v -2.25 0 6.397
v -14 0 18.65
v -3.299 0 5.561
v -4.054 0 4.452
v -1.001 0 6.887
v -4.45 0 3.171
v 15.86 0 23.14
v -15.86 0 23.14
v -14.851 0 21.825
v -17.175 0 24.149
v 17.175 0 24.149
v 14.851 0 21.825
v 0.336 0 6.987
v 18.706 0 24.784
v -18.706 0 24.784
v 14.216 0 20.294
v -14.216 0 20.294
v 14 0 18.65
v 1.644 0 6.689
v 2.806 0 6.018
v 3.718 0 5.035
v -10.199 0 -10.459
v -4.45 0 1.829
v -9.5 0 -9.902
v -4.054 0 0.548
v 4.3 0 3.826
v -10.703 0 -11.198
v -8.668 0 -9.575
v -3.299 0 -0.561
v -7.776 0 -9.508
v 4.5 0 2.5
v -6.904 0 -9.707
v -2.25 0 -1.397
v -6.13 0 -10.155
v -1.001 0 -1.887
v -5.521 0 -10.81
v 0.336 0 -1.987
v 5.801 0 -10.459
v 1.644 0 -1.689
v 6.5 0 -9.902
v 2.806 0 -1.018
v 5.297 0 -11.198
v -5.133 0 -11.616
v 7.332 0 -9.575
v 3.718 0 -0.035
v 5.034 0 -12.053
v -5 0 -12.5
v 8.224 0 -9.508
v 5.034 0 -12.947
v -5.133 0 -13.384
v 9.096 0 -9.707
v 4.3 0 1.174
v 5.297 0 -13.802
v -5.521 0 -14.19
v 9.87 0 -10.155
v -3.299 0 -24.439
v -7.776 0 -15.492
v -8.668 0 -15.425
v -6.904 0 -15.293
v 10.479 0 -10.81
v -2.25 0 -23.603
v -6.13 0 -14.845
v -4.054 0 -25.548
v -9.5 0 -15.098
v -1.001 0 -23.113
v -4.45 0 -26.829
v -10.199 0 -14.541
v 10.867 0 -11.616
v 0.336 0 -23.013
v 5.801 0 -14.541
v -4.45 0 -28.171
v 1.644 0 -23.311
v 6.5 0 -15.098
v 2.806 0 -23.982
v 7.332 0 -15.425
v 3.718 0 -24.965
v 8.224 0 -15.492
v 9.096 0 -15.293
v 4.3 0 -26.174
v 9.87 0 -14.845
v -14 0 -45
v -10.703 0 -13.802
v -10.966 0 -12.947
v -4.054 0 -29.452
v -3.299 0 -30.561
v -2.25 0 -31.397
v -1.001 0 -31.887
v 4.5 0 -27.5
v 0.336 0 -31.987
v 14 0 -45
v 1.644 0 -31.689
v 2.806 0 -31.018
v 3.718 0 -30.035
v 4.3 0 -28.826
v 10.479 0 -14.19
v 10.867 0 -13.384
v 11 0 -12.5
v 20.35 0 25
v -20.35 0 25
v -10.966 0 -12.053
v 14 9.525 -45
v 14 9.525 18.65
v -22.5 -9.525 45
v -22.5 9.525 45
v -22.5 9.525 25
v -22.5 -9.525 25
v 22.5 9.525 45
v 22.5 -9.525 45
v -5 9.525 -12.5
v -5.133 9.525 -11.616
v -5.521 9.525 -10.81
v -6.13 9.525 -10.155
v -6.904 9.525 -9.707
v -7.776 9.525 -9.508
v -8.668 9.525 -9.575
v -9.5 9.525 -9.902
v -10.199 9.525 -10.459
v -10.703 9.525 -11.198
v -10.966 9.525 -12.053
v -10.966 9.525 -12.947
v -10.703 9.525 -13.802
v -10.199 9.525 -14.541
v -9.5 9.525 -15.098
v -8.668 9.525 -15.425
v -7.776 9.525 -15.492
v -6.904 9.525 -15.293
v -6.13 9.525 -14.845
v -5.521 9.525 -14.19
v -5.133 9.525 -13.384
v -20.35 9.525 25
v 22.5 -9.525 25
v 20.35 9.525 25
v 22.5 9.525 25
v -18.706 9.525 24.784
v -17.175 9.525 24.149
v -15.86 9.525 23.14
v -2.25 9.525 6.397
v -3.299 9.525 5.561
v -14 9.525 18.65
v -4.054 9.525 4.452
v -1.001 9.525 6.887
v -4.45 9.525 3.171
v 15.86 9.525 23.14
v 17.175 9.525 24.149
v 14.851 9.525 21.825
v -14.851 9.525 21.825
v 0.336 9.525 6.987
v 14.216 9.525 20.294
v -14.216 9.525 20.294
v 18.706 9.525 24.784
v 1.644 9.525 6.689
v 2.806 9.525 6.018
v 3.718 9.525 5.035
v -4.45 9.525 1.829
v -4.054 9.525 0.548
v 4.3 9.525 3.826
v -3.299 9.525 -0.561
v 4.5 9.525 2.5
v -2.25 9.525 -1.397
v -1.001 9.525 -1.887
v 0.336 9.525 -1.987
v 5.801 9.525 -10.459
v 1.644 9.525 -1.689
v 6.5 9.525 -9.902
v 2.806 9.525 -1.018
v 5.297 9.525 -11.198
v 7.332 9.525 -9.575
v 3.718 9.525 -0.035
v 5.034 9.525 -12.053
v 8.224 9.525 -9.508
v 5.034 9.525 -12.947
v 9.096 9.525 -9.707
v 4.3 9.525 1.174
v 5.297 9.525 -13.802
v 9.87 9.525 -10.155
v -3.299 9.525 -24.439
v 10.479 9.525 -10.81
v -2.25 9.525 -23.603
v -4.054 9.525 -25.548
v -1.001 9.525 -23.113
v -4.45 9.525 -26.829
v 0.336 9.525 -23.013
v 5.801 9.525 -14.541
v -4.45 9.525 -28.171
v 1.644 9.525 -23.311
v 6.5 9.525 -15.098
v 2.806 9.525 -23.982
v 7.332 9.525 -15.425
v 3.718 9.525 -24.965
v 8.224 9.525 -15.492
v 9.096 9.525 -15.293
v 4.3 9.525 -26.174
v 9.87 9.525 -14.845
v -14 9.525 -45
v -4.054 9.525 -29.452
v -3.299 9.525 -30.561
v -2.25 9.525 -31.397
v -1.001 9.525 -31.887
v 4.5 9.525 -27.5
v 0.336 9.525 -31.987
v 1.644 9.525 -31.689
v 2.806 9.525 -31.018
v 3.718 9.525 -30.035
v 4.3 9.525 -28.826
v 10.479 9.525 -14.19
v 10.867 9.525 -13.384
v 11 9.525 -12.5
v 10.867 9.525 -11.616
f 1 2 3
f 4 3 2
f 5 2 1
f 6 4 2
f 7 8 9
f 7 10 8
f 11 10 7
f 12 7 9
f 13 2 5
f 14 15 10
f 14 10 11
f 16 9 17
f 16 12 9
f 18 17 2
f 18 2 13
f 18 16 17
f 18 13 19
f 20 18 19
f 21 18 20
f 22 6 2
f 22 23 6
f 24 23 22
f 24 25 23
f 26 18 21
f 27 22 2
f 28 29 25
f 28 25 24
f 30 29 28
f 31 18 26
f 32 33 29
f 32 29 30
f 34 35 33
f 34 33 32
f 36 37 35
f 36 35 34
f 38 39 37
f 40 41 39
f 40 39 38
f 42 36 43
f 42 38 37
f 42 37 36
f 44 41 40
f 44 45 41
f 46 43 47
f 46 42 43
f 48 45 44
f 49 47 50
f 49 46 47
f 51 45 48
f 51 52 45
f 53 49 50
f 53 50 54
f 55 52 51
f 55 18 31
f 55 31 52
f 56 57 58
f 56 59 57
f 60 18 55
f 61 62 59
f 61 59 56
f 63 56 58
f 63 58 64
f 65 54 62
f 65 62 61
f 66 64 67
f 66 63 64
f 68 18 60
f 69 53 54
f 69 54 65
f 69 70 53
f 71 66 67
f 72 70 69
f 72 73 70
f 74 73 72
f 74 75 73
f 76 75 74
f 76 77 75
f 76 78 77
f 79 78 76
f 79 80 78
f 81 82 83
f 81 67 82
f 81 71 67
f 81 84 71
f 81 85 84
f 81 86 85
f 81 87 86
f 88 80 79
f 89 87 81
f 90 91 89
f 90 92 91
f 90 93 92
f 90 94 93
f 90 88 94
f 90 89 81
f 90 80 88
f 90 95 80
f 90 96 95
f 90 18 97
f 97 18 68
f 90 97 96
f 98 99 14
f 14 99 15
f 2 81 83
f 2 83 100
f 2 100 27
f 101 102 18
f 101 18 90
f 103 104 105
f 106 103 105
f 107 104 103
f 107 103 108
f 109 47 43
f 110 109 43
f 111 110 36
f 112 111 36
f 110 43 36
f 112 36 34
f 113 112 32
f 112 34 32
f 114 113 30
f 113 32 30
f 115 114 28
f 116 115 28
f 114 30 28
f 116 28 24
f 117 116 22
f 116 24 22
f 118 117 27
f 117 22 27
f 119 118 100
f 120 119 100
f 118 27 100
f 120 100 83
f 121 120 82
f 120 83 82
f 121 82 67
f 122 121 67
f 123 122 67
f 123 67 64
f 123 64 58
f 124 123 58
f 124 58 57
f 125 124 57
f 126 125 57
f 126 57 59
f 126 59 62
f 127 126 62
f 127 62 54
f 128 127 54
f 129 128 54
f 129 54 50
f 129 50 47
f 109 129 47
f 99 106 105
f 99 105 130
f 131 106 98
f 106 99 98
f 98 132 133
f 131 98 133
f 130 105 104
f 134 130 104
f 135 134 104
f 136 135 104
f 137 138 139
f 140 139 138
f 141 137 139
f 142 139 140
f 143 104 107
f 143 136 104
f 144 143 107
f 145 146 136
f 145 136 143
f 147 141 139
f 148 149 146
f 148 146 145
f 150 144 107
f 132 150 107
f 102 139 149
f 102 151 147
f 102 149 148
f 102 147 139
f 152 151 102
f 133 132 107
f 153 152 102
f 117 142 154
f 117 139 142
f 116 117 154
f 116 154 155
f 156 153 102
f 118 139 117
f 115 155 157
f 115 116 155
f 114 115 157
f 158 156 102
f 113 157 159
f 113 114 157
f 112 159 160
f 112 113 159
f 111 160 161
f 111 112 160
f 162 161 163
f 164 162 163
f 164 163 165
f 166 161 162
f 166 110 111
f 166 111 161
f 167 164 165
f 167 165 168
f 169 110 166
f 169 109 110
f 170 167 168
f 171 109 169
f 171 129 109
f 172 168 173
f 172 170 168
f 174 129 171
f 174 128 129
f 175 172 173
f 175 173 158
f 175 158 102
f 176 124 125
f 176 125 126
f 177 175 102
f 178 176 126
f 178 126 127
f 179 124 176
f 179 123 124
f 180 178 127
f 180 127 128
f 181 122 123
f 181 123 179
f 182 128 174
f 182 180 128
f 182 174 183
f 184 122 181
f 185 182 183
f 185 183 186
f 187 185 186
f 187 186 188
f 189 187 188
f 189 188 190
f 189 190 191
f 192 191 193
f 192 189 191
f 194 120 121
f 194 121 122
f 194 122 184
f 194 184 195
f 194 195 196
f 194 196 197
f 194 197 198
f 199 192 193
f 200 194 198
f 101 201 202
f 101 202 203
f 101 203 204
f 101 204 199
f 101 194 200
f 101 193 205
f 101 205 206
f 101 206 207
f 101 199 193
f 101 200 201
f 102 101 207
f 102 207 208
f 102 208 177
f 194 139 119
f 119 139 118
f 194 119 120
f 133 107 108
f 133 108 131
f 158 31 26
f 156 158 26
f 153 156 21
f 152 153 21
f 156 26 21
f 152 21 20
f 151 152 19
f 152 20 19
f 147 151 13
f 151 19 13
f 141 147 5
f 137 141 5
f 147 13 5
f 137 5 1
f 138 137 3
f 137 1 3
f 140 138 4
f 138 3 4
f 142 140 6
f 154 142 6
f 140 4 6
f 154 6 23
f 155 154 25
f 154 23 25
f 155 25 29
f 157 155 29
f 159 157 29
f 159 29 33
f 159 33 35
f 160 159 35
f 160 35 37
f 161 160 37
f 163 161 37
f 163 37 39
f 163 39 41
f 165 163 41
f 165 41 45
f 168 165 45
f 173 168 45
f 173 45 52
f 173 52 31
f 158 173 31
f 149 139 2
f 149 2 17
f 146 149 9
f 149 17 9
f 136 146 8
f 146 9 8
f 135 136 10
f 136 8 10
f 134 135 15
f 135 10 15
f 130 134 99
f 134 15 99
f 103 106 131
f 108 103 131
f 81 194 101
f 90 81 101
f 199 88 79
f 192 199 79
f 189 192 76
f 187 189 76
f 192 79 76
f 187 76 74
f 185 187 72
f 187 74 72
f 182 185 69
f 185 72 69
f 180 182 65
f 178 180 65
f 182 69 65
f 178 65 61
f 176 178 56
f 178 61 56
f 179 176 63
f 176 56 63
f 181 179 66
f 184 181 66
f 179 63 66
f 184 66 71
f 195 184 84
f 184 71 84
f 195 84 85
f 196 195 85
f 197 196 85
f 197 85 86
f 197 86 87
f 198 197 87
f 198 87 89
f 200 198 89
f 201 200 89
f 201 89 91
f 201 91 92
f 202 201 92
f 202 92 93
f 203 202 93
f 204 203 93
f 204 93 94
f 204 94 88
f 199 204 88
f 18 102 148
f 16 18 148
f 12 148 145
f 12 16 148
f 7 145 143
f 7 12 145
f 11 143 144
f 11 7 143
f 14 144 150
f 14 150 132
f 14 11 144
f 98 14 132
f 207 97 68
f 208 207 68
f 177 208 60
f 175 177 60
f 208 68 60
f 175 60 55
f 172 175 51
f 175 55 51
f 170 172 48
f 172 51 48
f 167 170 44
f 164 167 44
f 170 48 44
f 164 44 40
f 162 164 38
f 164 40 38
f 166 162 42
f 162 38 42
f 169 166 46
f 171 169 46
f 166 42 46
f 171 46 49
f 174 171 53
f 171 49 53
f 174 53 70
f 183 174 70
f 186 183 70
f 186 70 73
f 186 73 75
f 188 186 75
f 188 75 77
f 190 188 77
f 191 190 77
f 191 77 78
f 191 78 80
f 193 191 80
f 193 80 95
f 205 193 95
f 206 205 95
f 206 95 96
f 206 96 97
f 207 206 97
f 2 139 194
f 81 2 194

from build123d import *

# Parameters (mm, degrees)
SKETCH2_W                = 45
SKETCH2_H                = 90
EXTRUDE2_DEPTH           = 9.525
SKETCH4_W                = 70
SKETCH4_H                = 9.525
CUT_EXTRUDE1_DEPTH       = 65.348470262
SKETCH5_W                = 8.5
SKETCH5_H                = 70
CUT_EXTRUDE2_DEPTH       = 54.797328001
FILLET1_R                = 6.35
F_6_0_6_DIAMETER_HOLE1_D = 6
M8_CLEARANCE_HOLE1_D     = 9


with BuildPart() as part:
    # Sketch2 → Extrude2 (new, symmetric)
    with BuildSketch(Plane(origin=(0, 0, 0), x_dir=(1, 0, 0), z_dir=(0, 1, 0))):
        Rectangle(SKETCH2_W, SKETCH2_H)
    extrude(amount=EXTRUDE2_DEPTH, both=True)

    # Sketch4 → Cut-Extrude1 (cut, through all)
    with BuildSketch(Plane(origin=(22.5, 0, 0), x_dir=(0, 0, -1), z_dir=(1, 0, 0))):
        with Locations((10, -4.7625)):
            Rectangle(SKETCH4_W, SKETCH4_H)
    extrude(amount=-CUT_EXTRUDE1_DEPTH, mode=Mode.SUBTRACT)

    # Sketch5 → Cut-Extrude2 (cut, through all)
    with BuildSketch(Plane(origin=(0, 9.525, 0), x_dir=(1, 0, 0), z_dir=(0, 1, 0))):
        with Locations((-18.25, 10)):
            Rectangle(SKETCH5_W, SKETCH5_H)
        with Locations((18.25, 10)):
            Rectangle(SKETCH5_W, SKETCH5_H)
    extrude(amount=-CUT_EXTRUDE2_DEPTH, mode=Mode.SUBTRACT)

    # Fillet1
    fillet1_edges = [part.edges().sort_by_distance(p)[0] for p in [
        (-14, 4.7625, 25),
        (14, 4.7625, 25),
    ]]
    fillet(fillet1_edges, radius=FILLET1_R)

    # Ø6.0 (6) Diameter Hole1 (through all)
    with Locations(Plane(origin=(0, 9.525, 0), x_dir=(-1, 0, 0), z_dir=(0, 1, 0))):
        with Locations((-8, -12.5), (8, -12.5)):
            Hole(F_6_0_6_DIAMETER_HOLE1_D / 2)

    # M8 Clearance Hole1 (through all)
    with Locations(Plane(origin=(0, 9.525, 0), x_dir=(-1, 0, 0), z_dir=(0, 1, 0))):
        with Locations((0, -27.5), (0, 2.5)):
            Hole(M8_CLEARANCE_HOLE1_D / 2)


solid = part.part
